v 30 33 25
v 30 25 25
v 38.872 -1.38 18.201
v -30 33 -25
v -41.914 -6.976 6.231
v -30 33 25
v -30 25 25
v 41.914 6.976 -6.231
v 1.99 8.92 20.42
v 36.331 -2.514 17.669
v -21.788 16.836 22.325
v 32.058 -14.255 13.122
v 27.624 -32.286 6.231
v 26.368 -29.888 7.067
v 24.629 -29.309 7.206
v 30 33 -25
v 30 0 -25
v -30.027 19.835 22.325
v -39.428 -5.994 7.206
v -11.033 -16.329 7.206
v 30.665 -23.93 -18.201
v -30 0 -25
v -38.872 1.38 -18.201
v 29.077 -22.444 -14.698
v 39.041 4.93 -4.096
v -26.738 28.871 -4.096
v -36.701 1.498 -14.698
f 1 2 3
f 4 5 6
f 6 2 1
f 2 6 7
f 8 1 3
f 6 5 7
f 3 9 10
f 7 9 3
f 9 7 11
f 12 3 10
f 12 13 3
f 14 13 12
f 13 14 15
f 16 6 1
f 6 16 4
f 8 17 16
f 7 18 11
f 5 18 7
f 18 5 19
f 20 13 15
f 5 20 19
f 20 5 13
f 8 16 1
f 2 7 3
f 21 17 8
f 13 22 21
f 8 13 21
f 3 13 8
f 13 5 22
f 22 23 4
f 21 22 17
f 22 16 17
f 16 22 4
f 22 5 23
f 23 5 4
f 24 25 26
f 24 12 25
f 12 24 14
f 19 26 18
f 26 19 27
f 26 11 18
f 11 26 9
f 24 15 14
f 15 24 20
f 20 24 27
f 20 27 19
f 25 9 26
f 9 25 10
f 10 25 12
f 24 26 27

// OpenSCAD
inside_base_x = 70.0;
inside_base_y = 31.0;
inside_base_z = 24.0;
crade_push_out = 20;
ledge_indent = 8.5;
tilt = [20, 0, -20];
thickness = 2.0;

mc_width = 60;
mc_height = 50;
mc_depth = 8;

outside_base_height_normal = inside_base_z + thickness;
outside_base_height_high = inside_base_z * 2;

module base_cube(high=false) {
    z = high == true ? outside_base_height_high : outside_base_height_normal;
    cube([inside_base_x + thickness * 2,
      inside_base_y + thickness * 2,
      z], center=true);
}

module mount_cubes() {
    y_offset = 25;
    
    
    translate([-mc_width/2, y_offset, -mc_height/2]) {
        cube([mc_width, mc_depth, mc_height]);
    }
    
    translate([-mc_width/2, 0, -mc_height/2]) {
        cube([mc_width, y_offset, mc_height/2]);
    }
}

module inside_cube() {
    cube([inside_base_x,
      inside_base_y,
      inside_base_z], center=true);
}


module cradle() {
    difference() {
        hull() {
            mount_cubes();
            rotate(tilt) base_cube();
        }
        
        z_offset = 30;

        rotate(tilt) translate([0, 0, thickness+z_offset/2]) {
            cube([inside_base_x,
                inside_base_y,
                inside_base_z+z_offset], center=true);
        }
    }
   
}

cradle();
    
